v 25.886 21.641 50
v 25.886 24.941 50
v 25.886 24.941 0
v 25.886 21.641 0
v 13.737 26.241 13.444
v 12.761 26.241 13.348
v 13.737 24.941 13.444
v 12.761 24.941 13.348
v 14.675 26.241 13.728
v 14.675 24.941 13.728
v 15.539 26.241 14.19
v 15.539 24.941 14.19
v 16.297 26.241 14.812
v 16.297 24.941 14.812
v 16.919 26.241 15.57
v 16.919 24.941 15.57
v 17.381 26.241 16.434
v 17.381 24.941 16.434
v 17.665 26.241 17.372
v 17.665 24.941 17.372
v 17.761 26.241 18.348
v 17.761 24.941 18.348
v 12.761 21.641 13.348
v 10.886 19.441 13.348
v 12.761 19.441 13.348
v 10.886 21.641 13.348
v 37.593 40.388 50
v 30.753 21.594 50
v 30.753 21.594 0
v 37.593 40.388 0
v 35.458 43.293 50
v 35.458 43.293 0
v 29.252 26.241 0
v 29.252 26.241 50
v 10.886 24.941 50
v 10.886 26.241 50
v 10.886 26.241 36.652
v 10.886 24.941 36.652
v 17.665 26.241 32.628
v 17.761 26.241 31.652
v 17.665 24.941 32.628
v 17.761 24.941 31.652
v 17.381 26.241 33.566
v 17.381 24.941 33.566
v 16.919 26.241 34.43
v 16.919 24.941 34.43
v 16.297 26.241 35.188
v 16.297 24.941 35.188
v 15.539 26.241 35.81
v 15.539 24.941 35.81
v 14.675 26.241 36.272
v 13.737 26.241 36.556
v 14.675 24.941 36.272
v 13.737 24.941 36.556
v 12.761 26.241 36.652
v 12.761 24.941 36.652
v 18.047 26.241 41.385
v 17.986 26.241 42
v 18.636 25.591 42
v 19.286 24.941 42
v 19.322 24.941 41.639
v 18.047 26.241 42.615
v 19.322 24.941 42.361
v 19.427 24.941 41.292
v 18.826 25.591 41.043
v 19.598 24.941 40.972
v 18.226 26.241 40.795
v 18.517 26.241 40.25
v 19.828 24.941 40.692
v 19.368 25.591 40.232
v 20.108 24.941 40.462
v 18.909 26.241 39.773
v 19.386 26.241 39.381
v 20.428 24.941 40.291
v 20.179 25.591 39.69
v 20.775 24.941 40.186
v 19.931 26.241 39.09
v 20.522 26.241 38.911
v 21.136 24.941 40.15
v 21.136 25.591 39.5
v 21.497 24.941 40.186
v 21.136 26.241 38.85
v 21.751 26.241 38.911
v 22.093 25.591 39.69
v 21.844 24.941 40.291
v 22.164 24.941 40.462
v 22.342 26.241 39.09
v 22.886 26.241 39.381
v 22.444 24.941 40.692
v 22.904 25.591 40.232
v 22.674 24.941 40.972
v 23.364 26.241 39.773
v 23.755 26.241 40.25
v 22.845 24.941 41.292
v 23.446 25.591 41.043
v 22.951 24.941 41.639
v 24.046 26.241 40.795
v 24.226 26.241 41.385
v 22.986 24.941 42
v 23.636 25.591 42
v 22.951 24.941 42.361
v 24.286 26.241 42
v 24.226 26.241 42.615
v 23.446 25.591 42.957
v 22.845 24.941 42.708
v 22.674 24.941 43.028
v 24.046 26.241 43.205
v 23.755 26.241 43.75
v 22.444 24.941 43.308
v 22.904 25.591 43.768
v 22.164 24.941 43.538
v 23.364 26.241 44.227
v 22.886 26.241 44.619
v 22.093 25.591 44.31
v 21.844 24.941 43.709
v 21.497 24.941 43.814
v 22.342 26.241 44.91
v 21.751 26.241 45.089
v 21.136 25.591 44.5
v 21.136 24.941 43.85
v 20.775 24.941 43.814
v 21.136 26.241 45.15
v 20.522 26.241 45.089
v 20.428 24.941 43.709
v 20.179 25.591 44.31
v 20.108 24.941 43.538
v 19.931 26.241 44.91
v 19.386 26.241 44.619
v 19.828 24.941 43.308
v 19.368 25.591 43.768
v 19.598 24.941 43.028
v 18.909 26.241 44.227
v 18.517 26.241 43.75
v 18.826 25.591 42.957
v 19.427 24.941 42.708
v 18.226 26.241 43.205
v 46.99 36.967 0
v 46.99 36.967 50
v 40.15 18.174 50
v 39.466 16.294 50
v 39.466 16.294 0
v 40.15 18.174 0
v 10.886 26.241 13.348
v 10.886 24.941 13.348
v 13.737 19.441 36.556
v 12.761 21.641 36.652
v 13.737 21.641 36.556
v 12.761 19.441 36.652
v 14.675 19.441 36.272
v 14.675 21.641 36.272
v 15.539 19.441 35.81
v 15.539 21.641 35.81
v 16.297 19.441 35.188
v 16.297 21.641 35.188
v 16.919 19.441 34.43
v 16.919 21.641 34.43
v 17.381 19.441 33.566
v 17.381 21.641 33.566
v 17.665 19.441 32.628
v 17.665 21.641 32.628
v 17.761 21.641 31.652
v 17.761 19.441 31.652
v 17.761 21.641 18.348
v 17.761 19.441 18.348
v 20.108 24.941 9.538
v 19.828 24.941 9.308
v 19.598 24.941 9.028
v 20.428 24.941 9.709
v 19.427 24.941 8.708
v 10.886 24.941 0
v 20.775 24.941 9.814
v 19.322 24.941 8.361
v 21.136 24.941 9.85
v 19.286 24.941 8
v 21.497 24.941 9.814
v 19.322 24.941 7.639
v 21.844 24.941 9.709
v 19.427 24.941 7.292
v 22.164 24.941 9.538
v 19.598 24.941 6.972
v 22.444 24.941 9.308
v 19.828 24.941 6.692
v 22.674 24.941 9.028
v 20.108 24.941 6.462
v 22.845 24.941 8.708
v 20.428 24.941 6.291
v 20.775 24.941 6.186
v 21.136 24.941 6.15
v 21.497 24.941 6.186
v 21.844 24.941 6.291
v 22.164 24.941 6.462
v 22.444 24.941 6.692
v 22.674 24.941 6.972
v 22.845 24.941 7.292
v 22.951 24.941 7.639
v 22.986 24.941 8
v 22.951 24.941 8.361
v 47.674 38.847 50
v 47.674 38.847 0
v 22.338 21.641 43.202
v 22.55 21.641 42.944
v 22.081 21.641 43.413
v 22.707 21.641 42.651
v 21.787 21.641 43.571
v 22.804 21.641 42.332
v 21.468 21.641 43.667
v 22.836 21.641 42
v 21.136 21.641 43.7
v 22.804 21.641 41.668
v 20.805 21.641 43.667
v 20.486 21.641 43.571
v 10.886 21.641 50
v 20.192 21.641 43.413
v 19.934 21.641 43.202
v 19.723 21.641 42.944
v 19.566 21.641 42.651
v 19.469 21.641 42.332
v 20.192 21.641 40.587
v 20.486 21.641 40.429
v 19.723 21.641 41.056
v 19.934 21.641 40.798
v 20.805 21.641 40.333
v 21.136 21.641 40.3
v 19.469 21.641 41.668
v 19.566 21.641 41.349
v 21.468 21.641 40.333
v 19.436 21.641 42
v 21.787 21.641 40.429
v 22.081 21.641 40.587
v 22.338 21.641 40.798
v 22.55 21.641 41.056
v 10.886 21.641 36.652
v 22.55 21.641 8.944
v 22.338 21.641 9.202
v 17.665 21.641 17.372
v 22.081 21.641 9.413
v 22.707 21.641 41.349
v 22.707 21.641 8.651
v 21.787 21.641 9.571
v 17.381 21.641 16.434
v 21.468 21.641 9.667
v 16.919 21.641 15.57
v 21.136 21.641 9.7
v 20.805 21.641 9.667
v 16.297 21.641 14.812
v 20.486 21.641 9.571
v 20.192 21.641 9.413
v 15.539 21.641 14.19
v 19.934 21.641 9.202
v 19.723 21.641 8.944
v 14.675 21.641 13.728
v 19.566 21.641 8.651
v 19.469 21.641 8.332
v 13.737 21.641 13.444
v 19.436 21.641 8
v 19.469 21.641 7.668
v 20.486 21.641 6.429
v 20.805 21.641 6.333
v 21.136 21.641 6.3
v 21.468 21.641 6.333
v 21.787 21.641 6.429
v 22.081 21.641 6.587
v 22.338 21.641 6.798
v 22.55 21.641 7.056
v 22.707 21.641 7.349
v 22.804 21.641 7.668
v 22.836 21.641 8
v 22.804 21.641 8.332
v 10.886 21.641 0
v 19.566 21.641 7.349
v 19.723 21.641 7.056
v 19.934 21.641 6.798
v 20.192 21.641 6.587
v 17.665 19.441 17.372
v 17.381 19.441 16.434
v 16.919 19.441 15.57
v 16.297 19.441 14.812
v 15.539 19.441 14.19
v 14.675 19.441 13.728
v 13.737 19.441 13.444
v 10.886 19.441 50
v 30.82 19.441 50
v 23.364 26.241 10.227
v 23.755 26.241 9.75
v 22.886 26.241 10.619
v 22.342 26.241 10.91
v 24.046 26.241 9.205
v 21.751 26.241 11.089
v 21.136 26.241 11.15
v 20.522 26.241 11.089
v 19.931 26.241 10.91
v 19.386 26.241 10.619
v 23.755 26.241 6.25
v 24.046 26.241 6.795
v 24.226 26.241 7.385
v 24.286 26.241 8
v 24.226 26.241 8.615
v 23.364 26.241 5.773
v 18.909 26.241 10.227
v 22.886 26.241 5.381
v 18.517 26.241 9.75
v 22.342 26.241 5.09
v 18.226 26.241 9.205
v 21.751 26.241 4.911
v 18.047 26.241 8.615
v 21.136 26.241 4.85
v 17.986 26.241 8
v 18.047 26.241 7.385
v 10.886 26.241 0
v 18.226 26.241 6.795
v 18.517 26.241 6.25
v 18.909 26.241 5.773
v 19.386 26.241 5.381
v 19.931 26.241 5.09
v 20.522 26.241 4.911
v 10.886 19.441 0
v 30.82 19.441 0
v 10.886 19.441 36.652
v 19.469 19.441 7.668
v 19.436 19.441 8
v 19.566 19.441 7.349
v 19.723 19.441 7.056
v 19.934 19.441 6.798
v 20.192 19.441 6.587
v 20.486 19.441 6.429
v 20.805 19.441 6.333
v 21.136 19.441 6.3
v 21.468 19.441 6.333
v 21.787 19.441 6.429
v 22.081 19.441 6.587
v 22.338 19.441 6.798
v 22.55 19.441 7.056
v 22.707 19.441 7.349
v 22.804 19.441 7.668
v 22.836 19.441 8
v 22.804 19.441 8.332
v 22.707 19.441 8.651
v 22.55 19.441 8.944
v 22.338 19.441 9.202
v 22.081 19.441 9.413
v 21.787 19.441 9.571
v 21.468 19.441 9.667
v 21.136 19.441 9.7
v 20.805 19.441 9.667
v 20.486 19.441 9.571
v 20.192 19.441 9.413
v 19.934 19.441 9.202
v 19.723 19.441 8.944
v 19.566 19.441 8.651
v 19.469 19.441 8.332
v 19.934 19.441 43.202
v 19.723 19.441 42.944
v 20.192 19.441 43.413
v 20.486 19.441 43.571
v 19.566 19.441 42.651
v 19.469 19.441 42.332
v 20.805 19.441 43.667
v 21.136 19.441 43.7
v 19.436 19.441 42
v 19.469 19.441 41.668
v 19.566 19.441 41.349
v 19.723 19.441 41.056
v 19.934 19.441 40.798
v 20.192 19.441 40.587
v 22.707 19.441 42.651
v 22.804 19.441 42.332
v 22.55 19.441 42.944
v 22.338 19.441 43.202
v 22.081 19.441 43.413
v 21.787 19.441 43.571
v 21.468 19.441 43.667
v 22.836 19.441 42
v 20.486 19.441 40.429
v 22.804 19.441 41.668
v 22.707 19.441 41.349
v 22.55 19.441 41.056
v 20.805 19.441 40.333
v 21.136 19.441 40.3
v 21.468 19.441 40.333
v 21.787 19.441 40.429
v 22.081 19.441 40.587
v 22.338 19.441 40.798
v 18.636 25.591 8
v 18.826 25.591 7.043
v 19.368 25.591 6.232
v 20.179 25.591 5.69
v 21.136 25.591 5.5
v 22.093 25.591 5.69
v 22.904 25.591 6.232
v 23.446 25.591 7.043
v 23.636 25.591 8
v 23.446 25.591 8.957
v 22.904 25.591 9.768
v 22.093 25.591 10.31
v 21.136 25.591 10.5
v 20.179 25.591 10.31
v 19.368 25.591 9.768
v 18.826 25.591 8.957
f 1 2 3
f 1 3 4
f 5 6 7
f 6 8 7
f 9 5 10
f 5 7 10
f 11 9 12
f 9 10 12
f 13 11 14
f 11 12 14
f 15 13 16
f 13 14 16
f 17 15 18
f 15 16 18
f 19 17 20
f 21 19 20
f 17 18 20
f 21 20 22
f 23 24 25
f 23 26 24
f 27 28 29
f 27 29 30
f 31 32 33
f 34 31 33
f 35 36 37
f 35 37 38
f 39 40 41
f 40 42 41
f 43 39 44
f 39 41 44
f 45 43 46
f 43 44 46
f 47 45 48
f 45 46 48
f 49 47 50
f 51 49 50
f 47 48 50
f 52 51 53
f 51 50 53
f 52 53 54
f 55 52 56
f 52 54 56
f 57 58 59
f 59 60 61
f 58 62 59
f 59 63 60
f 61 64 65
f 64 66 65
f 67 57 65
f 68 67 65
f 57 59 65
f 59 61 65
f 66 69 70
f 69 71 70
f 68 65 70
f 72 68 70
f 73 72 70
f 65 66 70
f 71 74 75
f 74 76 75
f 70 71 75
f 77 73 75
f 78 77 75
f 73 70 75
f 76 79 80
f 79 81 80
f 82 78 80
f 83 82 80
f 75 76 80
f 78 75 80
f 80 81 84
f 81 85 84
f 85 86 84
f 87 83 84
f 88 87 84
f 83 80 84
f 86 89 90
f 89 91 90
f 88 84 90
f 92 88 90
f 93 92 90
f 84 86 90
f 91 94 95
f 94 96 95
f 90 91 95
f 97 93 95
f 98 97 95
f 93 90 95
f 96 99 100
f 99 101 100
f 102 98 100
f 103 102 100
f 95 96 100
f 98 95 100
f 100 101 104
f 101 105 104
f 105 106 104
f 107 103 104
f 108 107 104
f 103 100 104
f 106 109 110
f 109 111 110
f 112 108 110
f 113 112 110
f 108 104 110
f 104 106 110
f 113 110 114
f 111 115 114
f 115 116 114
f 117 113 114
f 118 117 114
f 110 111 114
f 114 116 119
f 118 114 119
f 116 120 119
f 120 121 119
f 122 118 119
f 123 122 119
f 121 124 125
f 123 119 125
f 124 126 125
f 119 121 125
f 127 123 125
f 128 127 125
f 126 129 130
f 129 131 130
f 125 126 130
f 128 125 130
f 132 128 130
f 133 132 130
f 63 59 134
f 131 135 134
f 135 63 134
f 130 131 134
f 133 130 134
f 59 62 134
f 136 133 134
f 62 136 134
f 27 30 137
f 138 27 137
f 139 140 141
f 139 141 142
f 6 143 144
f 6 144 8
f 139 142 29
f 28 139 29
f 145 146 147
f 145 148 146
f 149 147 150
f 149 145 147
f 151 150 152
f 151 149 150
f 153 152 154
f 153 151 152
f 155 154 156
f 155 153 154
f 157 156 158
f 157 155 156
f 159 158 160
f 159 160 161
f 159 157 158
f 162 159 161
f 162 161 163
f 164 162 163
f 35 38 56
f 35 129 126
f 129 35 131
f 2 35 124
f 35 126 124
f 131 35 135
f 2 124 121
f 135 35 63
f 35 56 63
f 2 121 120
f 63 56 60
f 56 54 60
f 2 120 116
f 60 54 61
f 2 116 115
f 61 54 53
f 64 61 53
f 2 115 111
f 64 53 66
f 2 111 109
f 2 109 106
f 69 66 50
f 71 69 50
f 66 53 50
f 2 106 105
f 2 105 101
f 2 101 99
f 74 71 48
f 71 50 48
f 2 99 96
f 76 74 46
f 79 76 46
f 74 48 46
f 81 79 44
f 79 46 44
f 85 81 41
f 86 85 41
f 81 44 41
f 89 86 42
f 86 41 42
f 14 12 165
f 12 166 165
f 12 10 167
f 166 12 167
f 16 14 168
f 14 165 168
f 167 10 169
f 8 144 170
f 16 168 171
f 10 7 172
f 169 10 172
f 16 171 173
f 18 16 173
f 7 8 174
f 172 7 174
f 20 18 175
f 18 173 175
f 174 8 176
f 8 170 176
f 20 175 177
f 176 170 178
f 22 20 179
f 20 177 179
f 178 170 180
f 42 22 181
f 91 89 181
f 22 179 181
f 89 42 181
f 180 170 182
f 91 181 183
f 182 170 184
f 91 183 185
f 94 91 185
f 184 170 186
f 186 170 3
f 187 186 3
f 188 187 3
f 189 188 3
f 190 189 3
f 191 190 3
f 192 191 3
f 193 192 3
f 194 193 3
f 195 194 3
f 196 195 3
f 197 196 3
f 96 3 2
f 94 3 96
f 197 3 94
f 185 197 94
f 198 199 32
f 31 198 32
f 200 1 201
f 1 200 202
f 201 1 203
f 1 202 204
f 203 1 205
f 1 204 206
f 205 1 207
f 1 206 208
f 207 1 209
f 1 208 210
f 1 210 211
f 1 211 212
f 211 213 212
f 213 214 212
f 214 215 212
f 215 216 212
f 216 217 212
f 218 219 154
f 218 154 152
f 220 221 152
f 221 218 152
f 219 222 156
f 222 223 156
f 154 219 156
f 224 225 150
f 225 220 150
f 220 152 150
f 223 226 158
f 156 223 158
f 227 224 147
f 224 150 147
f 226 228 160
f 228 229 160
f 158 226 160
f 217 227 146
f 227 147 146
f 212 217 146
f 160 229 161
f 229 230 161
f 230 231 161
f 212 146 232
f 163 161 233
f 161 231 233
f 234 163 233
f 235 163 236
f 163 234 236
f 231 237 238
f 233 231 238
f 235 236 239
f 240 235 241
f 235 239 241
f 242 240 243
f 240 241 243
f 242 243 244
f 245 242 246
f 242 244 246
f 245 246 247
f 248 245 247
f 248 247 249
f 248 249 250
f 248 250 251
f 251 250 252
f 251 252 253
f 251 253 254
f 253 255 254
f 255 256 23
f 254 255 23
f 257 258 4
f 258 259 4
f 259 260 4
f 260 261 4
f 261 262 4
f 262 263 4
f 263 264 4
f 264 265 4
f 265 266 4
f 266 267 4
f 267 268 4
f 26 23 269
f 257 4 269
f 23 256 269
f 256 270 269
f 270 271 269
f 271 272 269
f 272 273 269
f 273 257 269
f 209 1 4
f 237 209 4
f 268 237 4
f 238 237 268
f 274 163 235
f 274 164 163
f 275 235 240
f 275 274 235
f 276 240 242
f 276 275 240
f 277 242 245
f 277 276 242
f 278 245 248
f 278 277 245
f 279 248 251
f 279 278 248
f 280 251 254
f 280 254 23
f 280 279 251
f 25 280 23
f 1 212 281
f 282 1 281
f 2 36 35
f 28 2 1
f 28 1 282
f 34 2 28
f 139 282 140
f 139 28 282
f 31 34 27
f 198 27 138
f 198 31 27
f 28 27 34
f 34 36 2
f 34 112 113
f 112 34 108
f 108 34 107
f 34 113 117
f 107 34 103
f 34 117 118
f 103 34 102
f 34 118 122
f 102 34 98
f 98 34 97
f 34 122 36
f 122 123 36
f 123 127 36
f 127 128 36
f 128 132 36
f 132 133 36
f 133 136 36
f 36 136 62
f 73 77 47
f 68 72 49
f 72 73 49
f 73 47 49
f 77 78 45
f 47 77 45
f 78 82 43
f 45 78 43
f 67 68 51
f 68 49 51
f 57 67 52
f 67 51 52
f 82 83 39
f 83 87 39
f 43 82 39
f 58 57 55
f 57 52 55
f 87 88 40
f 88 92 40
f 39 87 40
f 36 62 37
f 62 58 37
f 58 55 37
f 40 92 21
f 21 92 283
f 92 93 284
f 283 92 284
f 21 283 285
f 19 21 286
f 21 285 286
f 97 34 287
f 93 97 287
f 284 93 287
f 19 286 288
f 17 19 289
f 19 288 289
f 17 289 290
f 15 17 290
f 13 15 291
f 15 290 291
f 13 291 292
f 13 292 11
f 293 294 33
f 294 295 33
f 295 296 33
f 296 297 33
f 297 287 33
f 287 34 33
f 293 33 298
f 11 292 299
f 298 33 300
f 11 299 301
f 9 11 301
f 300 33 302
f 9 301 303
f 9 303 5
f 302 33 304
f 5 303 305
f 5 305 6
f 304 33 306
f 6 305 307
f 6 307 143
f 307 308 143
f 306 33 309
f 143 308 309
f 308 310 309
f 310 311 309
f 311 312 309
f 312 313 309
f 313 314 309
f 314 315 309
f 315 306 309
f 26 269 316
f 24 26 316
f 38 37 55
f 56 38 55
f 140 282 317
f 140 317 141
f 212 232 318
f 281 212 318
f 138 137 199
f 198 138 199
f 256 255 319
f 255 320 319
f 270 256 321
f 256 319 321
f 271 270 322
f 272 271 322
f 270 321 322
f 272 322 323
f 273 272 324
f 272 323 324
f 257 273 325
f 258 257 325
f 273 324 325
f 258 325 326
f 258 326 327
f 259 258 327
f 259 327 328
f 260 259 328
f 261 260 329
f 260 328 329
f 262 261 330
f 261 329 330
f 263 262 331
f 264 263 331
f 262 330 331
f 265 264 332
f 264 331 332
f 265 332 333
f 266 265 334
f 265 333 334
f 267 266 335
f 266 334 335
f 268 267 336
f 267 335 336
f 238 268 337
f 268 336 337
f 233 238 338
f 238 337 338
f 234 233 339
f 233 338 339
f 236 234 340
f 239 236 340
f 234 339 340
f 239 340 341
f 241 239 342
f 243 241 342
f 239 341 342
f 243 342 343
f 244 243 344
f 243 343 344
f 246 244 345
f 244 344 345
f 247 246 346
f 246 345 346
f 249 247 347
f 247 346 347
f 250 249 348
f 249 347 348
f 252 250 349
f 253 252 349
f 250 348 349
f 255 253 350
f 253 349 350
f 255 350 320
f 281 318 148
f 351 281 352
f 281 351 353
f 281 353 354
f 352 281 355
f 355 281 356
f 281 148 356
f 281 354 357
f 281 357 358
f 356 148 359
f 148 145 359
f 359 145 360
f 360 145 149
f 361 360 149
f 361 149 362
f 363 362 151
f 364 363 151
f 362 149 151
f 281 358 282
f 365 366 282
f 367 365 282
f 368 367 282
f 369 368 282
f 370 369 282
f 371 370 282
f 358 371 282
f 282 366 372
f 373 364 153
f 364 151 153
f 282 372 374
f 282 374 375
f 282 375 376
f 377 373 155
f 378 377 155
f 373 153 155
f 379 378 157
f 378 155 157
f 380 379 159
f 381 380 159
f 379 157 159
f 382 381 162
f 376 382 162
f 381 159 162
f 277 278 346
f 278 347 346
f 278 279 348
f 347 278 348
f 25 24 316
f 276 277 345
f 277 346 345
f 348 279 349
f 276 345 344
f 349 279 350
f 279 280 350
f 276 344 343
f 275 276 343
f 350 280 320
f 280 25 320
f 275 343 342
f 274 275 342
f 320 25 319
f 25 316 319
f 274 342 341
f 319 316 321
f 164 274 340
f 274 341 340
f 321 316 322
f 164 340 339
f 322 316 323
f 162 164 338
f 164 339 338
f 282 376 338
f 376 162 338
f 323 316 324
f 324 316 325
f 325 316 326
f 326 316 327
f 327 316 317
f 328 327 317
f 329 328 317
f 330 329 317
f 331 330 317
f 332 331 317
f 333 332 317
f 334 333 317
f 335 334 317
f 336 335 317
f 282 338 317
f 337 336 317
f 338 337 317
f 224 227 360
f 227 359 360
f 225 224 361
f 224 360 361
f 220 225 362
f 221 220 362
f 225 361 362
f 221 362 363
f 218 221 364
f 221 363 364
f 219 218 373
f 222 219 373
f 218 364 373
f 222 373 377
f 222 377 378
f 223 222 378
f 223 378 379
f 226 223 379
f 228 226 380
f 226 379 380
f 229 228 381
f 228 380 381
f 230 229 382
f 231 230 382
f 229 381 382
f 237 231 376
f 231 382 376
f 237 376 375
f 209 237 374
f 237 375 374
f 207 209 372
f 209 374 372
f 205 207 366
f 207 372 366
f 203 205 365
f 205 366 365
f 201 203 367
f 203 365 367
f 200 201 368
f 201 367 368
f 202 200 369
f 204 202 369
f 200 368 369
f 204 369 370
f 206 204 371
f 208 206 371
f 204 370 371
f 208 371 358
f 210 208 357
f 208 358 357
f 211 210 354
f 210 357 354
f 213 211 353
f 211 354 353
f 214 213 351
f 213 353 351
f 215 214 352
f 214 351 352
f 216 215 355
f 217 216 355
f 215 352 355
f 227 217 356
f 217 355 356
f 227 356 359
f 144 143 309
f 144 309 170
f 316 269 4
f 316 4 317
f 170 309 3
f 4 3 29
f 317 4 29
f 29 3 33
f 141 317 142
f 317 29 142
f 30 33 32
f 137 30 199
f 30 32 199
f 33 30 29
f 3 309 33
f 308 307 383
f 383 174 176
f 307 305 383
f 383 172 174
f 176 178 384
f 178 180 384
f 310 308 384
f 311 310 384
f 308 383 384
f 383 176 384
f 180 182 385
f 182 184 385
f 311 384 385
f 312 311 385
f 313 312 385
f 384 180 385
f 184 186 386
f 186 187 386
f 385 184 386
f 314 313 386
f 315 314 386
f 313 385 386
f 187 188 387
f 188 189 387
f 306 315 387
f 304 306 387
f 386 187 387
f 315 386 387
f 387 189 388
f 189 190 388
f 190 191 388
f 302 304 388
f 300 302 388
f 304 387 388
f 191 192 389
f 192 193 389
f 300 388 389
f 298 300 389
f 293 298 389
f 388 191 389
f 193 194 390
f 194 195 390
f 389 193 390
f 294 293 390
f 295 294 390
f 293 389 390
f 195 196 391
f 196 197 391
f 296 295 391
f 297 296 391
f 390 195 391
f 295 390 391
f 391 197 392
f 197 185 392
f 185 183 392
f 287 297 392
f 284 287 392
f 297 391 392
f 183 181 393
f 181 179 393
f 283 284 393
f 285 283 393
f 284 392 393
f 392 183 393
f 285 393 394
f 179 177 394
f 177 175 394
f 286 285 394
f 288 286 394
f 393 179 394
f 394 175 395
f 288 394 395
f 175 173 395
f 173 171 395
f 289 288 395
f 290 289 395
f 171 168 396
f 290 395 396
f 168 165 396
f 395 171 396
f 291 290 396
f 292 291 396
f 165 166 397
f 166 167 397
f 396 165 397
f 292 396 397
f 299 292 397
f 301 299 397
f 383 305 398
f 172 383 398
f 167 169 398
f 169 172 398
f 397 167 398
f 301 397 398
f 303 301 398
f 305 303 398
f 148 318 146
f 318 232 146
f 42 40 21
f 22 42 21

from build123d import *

# Parameters (mm, degrees)
DAMPINGBRACKETGEOMETRY_DEPTH                    = 50
CSK_FOR_M3_FLAT_HEAD_MACHINE_SCREW1_D           = 3.4
CSK_FOR_M3_FLAT_HEAD_MACHINE_SCREW1_CSINK_D     = 6.3
CSK_FOR_M3_FLAT_HEAD_MACHINE_SCREW1_CSINK_ANGLE = 90
SKETCH5_W                                       = 13.75
SKETCH5_H                                       = 23.30481037
CUT_EXTRUDE1_DEPTH                              = 72.15904504
FILLET1_R                                       = 5


with BuildPart() as part:
    # Sketch1 → DampingBracketGeometry (new body)
    with BuildSketch(Plane.XY):
        Polygon((10.886169422, 19.440829014), (30.820361381, 19.440829014), (39.465737075, 16.294169597), (40.149777362, 18.173554838), (30.752851154, 21.593756272), (37.593254021, 40.387608687), (46.990180228, 36.967407254), (47.674220515, 38.846792496), (35.458216445, 43.293054359), (29.251713991, 26.240829014), (10.886169422, 26.240829014), (10.886169422, 24.940829014), (25.886169422, 24.940829014), (25.886169422, 21.640829014), (10.886169422, 21.640829014), align=None)
    extrude(amount=DAMPINGBRACKETGEOMETRY_DEPTH)

    # CSK for M3 Flat Head Machine Screw1 (through all)
    with Locations(Plane(origin=(0, 26.240829014, 0), x_dir=(1, 0, 0), z_dir=(0, 1, 0))):
        with Locations((21.136169422, -8), (21.136169422, -42)):
            CounterSinkHole(CSK_FOR_M3_FLAT_HEAD_MACHINE_SCREW1_D / 2, CSK_FOR_M3_FLAT_HEAD_MACHINE_SCREW1_CSINK_D / 2, counter_sink_angle=CSK_FOR_M3_FLAT_HEAD_MACHINE_SCREW1_CSINK_ANGLE)

    # Sketch5 → Cut-Extrude1 (cut, through all)
    with BuildSketch(Plane(origin=(0, 26.240829014, 0), x_dir=(1, 0, 0), z_dir=(0, 1, 0))):
        with Locations((10.886169422, -25)):
            Rectangle(SKETCH5_W, SKETCH5_H)
    extrude(amount=-CUT_EXTRUDE1_DEPTH, mode=Mode.SUBTRACT)

    # Fillet1
    fillet1_edges = [part.edges().sort_by_distance(p)[0] for p in [
        (17.761169422, 20.540829014, 13.347594815),
        (17.761169422, 25.590829014, 13.347594815),
        (17.761169422, 25.590829014, 36.652405185),
        (17.761169422, 20.540829014, 36.652405185),
    ]]
    fillet(fillet1_edges, radius=FILLET1_R)


solid = part.part
